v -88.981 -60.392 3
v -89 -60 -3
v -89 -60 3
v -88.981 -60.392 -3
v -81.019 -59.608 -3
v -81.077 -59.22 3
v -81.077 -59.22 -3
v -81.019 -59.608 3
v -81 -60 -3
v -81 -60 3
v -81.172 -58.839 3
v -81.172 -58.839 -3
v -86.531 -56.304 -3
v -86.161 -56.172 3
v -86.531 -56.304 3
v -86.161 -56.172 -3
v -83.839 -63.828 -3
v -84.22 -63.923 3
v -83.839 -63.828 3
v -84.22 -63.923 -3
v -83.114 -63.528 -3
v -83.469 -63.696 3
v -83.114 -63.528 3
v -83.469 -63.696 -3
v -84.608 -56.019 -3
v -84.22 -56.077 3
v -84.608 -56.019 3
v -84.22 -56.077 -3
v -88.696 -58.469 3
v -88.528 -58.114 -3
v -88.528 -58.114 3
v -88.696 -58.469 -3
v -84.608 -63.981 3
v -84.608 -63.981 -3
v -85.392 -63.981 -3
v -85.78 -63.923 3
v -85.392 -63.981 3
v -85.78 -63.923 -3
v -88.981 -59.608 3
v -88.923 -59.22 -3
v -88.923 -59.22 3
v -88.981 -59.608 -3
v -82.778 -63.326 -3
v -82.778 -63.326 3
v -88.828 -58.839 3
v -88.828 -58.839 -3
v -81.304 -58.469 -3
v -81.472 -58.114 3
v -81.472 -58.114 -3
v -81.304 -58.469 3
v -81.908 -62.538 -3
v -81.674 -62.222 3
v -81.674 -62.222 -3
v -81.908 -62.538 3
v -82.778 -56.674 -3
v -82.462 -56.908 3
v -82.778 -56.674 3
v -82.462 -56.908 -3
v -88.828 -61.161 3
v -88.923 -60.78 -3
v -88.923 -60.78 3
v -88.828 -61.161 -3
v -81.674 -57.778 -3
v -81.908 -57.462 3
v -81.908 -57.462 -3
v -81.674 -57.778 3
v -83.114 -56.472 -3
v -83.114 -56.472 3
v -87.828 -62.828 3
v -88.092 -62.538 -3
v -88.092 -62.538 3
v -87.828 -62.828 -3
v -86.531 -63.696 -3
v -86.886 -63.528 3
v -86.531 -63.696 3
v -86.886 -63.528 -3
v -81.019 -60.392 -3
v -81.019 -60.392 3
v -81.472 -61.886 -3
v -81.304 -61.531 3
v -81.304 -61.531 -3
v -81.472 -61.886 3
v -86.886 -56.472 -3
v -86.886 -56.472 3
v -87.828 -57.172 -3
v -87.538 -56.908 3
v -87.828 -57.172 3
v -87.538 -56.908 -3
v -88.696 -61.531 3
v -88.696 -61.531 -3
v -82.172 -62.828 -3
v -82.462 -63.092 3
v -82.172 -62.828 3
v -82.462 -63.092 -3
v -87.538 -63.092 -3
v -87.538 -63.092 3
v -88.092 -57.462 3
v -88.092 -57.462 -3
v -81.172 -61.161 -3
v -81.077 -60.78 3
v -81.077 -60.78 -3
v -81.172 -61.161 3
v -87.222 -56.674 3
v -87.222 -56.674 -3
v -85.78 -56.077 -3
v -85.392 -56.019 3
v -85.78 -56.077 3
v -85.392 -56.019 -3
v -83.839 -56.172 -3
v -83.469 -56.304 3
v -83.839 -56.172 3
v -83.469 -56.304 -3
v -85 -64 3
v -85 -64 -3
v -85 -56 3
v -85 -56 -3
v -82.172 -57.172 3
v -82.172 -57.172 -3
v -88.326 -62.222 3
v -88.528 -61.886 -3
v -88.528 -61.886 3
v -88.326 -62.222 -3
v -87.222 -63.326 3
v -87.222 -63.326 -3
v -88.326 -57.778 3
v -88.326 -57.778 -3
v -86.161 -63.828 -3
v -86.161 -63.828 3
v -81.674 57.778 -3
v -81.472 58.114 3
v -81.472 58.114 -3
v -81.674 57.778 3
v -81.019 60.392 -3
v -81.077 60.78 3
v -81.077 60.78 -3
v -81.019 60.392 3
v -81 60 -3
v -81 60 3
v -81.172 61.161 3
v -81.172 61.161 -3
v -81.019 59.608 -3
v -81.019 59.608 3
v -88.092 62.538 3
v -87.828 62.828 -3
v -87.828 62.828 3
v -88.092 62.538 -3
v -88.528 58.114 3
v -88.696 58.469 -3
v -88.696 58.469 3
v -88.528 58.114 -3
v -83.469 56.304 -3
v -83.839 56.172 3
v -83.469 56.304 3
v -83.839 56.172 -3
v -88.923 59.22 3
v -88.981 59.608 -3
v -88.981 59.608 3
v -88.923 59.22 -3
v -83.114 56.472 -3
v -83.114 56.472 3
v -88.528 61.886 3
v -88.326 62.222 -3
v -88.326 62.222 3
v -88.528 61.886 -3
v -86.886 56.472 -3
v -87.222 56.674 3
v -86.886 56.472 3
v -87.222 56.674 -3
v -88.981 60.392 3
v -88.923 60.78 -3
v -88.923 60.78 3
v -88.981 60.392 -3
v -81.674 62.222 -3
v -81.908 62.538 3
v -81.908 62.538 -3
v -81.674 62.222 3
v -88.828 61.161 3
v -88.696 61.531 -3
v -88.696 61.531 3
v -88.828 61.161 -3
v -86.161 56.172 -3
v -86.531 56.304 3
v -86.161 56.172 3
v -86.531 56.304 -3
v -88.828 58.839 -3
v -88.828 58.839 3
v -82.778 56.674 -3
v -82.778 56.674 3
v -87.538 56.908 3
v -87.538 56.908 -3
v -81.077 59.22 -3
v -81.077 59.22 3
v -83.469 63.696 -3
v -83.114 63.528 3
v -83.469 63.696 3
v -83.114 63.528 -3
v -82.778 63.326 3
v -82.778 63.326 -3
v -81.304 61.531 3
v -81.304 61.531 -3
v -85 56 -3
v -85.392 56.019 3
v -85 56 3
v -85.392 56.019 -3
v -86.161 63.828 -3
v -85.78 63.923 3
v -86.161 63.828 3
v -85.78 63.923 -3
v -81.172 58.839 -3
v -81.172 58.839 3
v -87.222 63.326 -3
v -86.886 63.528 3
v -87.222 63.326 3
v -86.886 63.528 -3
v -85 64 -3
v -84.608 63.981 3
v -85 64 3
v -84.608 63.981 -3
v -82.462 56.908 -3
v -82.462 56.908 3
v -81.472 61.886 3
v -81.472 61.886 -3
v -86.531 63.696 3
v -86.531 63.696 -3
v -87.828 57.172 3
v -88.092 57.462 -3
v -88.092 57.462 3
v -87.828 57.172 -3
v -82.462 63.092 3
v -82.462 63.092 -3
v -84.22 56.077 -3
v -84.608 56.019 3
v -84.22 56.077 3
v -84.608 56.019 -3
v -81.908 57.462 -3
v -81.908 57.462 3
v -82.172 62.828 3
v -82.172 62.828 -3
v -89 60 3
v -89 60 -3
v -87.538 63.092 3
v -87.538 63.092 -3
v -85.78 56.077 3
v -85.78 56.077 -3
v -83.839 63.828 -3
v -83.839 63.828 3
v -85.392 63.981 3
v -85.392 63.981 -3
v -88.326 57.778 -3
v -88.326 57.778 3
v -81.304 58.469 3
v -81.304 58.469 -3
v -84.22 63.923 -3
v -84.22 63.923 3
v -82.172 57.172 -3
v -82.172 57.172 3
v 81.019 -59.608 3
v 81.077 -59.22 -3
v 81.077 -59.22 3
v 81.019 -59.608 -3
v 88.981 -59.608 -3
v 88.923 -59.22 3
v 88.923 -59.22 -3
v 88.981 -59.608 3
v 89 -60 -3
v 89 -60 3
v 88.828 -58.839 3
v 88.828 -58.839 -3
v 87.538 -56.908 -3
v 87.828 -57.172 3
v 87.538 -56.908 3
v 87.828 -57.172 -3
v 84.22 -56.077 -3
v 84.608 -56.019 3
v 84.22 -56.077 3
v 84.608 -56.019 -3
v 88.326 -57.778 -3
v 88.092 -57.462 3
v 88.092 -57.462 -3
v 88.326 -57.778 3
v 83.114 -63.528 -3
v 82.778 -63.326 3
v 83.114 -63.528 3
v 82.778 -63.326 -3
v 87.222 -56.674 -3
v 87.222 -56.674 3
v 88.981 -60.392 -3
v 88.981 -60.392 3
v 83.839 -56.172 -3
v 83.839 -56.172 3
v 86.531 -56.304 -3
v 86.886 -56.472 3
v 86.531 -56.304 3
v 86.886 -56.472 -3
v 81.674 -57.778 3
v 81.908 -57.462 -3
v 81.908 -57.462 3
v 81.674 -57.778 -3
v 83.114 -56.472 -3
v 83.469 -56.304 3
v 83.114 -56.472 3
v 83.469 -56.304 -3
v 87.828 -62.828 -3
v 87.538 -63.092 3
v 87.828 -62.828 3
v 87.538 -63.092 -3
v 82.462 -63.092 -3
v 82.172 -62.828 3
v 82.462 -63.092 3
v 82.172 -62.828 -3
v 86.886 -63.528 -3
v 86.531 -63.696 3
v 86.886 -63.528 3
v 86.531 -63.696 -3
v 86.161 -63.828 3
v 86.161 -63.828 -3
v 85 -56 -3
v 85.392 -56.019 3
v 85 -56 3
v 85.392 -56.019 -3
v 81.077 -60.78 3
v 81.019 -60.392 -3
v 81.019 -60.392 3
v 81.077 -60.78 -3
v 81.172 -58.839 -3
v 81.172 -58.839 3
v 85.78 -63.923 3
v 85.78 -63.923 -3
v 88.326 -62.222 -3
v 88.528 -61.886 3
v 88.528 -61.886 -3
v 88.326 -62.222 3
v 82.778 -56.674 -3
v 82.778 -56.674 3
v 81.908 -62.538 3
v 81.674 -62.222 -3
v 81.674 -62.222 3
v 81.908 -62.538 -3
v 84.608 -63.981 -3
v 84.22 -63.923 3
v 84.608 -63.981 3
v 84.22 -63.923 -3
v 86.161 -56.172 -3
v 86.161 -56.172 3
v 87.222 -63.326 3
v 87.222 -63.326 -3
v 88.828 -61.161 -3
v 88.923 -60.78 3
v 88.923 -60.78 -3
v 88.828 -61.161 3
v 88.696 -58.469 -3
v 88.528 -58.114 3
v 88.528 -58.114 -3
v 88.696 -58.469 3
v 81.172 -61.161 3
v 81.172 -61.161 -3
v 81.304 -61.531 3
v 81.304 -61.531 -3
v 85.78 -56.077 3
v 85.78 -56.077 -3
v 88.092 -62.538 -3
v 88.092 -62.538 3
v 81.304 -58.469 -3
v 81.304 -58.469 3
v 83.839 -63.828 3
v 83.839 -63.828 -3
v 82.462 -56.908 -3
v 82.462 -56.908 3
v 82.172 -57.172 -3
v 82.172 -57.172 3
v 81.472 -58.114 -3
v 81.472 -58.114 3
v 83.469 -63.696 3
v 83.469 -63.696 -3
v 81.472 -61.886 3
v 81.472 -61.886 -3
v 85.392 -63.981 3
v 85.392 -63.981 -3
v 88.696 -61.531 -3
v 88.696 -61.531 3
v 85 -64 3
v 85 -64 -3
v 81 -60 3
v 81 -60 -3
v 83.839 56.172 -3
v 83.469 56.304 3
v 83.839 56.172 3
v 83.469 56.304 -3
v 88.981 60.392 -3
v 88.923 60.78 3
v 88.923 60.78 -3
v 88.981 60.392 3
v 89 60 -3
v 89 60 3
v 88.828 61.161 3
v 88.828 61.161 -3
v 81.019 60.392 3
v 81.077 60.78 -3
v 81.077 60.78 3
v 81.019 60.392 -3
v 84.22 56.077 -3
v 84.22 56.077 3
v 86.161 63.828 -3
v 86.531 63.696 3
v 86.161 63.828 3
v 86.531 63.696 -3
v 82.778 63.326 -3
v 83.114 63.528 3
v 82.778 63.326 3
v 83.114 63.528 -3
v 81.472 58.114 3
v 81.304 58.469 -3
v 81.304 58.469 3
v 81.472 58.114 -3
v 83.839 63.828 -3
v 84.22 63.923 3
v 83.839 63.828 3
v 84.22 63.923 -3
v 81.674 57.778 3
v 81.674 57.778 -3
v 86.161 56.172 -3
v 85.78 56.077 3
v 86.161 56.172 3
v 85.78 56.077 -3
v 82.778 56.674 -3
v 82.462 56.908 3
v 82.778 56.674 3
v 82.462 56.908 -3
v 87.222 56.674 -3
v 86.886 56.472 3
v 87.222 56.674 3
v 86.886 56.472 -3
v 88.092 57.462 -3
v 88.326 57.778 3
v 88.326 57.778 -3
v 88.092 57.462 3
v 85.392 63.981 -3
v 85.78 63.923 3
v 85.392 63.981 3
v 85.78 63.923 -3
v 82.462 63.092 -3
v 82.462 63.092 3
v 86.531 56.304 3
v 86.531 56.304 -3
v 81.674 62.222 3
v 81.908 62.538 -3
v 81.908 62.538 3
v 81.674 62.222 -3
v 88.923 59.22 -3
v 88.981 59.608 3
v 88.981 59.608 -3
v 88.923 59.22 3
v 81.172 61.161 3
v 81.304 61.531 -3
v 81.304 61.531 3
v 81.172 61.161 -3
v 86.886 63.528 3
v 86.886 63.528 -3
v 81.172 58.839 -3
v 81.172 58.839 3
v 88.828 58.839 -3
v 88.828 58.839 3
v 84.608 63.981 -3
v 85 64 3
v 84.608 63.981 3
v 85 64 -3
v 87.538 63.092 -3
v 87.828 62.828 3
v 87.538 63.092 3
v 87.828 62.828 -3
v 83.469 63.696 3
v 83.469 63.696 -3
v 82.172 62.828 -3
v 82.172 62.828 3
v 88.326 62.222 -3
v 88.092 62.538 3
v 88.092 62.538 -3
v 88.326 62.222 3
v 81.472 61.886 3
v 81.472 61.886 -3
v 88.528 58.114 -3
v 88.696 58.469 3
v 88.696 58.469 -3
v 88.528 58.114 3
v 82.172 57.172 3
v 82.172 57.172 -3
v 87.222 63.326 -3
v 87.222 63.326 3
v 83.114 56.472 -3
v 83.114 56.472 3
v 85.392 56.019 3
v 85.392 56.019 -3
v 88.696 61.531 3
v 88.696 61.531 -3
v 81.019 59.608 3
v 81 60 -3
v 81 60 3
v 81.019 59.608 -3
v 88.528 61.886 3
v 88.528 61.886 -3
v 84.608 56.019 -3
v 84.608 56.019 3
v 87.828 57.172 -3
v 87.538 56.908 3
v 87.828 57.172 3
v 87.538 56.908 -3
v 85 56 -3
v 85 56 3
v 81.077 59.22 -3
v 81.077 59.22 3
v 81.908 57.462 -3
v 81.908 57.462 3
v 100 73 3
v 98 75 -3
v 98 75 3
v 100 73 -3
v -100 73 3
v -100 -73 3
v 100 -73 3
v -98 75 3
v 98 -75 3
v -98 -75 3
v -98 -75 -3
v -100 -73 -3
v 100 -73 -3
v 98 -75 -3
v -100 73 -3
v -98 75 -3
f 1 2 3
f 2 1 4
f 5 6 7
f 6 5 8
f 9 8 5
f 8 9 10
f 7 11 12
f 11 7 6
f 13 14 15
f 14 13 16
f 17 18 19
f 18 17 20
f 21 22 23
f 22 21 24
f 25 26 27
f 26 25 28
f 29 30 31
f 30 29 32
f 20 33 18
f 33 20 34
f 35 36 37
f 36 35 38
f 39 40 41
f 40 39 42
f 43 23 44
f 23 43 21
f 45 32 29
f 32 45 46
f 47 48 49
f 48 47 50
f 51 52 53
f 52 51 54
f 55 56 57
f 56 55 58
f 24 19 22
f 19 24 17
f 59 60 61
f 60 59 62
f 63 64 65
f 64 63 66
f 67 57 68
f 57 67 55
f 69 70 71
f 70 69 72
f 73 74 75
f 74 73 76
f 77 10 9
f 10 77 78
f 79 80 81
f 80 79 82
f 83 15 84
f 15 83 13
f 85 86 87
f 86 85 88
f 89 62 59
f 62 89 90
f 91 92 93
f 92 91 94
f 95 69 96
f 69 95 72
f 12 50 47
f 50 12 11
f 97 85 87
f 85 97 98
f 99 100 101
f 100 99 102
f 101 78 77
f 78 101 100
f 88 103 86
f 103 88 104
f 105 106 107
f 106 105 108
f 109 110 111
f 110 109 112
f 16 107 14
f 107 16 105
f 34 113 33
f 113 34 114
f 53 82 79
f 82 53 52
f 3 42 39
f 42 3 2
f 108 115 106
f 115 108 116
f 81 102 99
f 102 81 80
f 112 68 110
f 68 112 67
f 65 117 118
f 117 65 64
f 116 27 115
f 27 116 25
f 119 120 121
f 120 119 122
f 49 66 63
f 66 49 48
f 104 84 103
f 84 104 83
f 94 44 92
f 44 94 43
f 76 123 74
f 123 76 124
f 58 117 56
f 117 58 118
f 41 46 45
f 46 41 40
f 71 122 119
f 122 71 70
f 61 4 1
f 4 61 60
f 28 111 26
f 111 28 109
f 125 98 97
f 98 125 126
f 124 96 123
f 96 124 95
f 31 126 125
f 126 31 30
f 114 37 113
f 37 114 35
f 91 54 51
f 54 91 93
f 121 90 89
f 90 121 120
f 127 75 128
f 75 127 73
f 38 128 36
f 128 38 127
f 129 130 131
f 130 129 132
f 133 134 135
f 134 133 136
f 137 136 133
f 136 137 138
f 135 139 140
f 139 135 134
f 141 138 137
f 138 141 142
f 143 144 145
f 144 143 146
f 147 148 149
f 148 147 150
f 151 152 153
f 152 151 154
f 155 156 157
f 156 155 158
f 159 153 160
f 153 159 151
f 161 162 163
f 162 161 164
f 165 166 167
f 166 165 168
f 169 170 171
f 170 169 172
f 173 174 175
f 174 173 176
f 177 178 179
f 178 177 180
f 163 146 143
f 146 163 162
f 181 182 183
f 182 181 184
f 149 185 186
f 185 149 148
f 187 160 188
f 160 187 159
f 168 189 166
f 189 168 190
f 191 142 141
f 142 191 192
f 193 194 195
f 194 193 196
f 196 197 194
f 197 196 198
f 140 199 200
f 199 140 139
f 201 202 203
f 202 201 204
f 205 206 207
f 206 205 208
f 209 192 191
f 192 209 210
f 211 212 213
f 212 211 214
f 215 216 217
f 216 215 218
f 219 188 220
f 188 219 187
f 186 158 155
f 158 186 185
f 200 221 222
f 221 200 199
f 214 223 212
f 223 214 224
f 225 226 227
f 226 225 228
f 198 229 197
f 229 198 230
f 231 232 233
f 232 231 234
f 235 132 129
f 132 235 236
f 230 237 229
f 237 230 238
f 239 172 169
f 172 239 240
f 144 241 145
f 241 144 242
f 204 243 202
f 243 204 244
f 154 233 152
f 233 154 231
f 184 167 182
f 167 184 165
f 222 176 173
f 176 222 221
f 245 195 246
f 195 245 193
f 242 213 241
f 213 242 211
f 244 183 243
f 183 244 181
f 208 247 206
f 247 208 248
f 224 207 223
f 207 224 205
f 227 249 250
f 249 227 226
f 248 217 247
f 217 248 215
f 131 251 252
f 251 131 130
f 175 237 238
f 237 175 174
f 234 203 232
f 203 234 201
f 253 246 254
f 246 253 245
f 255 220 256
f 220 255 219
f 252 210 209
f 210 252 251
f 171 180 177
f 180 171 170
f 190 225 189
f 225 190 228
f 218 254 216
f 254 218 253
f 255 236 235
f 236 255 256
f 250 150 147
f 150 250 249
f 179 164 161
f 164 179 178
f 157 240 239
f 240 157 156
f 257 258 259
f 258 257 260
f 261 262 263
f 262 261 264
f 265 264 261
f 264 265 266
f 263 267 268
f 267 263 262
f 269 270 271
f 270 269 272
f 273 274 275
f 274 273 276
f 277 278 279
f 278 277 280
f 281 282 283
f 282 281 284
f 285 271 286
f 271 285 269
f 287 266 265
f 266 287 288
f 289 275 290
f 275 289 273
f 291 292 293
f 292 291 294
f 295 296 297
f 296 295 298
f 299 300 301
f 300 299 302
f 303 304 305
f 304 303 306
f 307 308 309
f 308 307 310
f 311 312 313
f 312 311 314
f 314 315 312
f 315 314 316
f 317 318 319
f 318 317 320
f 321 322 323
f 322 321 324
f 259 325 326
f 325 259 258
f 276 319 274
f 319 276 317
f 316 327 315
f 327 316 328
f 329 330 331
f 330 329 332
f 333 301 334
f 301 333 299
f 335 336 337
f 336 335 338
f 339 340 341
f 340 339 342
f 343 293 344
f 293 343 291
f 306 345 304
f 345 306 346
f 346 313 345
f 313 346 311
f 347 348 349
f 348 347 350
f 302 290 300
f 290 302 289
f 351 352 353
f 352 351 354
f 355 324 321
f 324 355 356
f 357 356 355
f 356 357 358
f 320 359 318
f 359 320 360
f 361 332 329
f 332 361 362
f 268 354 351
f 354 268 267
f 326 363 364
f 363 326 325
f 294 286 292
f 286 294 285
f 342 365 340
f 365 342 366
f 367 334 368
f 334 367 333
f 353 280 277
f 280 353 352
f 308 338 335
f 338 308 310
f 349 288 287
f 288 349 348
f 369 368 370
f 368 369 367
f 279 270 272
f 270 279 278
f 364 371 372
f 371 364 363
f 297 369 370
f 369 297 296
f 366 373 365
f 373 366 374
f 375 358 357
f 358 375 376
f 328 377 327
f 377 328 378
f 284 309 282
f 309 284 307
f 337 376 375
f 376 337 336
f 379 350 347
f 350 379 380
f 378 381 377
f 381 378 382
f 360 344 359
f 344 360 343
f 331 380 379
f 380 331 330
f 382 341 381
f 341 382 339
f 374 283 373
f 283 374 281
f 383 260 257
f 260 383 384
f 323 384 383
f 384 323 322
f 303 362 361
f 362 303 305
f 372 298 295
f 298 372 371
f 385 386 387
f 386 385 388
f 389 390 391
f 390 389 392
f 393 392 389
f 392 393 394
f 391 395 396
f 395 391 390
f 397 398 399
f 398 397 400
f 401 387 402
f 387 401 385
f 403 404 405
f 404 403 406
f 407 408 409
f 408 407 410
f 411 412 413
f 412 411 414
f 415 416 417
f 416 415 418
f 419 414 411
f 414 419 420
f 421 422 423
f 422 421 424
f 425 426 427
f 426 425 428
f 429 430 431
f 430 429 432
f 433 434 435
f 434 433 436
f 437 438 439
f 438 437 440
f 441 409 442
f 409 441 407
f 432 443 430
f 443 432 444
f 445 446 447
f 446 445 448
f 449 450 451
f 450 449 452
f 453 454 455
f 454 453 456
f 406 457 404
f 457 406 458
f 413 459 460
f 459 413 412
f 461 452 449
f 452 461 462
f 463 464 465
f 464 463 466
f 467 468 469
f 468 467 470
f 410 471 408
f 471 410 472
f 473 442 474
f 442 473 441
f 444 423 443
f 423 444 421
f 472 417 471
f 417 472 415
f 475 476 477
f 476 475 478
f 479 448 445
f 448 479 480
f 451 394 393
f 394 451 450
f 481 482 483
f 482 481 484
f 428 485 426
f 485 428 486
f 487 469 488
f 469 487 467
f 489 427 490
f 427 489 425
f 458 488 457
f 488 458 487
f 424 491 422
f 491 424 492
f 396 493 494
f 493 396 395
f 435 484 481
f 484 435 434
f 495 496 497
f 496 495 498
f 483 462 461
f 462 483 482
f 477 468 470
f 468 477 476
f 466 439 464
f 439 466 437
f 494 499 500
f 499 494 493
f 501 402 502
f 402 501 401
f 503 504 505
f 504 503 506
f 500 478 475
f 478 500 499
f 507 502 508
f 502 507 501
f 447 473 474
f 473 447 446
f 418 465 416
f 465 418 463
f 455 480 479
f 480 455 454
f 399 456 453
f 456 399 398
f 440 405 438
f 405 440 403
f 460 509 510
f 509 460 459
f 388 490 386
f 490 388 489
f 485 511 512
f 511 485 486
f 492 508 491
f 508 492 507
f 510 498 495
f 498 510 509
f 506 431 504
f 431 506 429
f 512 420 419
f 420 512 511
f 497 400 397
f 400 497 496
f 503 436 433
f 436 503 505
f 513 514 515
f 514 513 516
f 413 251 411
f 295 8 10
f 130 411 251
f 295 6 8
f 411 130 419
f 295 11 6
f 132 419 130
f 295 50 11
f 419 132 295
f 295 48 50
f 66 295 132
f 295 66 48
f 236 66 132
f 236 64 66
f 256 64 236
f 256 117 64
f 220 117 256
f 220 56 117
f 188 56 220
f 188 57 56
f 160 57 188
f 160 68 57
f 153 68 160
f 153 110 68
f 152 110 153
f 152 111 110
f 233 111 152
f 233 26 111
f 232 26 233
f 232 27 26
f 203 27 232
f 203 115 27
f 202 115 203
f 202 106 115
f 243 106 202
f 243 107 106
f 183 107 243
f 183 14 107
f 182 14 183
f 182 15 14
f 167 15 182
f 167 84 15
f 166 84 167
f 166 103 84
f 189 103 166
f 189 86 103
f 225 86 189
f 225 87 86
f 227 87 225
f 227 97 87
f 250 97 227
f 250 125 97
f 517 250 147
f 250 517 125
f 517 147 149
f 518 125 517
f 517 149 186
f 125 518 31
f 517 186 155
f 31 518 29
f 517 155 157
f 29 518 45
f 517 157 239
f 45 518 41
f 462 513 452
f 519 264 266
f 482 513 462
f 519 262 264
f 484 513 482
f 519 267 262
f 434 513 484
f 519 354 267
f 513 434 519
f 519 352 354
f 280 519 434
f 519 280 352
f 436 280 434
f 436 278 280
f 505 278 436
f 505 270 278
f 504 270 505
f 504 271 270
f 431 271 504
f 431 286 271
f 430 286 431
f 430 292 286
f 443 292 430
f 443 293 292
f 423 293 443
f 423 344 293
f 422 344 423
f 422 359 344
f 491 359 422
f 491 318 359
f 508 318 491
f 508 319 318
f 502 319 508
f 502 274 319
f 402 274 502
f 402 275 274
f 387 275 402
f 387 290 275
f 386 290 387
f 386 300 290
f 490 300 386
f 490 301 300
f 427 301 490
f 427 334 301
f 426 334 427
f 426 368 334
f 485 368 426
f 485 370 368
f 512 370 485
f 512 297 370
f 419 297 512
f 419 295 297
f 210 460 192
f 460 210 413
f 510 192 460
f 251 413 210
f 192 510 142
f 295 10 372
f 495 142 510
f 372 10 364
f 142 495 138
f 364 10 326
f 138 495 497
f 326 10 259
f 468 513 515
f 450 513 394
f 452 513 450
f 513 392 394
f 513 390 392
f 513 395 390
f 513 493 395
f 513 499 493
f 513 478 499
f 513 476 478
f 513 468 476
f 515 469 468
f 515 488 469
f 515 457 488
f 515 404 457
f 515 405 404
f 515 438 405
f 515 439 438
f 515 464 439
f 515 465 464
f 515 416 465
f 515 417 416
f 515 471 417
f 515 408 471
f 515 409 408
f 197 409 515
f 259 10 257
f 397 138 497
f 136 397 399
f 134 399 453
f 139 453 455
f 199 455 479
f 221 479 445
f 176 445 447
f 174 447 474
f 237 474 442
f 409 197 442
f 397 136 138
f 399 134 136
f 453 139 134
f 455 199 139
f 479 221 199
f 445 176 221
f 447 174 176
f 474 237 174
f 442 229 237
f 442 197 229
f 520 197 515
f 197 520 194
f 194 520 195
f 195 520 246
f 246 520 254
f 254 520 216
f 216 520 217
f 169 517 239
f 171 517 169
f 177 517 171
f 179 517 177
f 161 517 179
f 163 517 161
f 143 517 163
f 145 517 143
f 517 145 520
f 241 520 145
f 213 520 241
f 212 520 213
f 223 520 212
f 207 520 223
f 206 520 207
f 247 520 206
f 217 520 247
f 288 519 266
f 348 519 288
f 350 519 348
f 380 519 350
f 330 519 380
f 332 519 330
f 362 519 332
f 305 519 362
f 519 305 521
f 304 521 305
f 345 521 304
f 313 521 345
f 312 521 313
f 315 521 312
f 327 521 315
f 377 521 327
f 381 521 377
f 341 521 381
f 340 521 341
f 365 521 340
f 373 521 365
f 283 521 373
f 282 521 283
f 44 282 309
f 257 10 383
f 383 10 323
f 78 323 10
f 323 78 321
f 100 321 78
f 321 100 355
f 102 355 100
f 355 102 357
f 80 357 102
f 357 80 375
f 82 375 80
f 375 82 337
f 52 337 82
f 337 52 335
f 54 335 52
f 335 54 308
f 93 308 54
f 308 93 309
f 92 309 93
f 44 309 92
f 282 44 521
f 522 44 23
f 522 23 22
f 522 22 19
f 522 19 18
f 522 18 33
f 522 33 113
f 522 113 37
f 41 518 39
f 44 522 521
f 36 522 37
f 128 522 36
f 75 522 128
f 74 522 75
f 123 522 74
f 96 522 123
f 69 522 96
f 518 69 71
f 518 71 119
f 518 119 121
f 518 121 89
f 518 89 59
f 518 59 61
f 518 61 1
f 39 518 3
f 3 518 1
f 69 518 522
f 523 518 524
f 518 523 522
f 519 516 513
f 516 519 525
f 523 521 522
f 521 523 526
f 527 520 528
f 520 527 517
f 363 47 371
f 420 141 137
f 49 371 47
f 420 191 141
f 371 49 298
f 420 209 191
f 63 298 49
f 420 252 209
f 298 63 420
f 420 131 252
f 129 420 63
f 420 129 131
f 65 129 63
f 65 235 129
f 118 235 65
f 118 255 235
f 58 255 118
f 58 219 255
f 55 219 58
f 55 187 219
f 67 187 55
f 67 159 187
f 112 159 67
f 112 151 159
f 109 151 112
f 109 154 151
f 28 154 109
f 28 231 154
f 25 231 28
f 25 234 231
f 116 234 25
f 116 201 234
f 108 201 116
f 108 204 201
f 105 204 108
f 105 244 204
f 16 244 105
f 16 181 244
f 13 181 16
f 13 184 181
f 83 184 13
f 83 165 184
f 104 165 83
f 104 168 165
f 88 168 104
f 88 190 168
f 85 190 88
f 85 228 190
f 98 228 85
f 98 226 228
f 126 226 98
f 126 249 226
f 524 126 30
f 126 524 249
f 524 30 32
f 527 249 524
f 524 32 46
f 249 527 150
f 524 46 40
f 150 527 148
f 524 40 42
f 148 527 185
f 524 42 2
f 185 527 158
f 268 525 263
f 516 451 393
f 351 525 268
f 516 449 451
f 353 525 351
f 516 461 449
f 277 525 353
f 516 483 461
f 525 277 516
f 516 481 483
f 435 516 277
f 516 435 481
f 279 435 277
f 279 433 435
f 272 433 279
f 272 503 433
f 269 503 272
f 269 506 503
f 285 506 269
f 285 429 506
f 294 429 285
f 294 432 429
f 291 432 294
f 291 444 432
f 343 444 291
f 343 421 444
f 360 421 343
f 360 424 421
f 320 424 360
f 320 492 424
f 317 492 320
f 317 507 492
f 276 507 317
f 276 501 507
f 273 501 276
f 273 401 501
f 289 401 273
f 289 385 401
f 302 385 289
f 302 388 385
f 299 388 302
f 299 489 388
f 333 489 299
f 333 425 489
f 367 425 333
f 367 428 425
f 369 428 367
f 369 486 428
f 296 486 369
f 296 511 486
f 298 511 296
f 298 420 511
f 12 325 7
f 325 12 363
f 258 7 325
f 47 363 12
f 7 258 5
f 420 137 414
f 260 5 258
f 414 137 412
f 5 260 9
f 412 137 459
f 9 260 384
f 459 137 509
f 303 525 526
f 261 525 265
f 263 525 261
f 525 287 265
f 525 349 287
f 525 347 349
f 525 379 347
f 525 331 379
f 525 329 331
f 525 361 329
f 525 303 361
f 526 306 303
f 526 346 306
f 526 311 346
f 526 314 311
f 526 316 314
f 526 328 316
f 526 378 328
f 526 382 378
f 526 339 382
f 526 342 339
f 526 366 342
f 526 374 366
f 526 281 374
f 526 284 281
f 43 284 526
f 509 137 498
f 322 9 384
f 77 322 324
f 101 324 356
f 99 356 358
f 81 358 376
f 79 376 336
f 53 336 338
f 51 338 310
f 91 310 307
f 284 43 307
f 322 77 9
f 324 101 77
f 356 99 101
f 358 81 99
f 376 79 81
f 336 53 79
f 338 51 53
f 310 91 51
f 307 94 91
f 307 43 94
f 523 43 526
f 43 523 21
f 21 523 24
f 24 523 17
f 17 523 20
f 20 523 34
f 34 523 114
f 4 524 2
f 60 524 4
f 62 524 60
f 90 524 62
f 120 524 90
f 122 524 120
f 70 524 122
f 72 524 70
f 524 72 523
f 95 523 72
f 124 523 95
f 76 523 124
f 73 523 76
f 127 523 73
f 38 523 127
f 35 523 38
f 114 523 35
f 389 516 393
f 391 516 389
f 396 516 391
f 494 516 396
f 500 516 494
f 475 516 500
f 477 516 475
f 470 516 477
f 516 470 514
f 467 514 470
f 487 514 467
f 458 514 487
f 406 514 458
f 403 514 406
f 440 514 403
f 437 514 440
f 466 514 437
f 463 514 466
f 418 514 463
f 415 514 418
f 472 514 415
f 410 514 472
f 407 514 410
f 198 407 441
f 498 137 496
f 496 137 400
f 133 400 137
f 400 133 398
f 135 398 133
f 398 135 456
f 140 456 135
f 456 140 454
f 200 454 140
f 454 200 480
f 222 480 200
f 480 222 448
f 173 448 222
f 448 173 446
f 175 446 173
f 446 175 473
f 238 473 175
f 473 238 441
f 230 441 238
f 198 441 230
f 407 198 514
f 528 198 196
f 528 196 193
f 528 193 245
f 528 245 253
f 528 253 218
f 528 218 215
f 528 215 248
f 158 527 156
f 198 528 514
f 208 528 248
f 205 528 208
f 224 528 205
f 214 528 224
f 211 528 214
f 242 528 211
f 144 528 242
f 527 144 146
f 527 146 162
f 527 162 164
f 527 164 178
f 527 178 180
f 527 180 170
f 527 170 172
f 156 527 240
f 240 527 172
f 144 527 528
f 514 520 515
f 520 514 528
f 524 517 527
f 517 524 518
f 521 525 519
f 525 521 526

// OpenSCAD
$fn = 64;

// Aluminium tooling plate (sheet) with subtle corner chamfers and mounting holes
length = 200;
width  = 150;
thickness = 6;

chamfer = 2;          // small edge chamfer to distinguish from a plain cube
hole_d = 8;           // typical mounting hole diameter
edge_margin = 15;     // distance from edges to hole centers

module chamfered_plate(l, w, t, c) {
    // 2D rectangle with 45° corner chamfers, then extruded
    linear_extrude(height=t, center=true)
        polygon(points=[
            [-l/2 + c, -w/2],
            [ l/2 - c, -w/2],
            [ l/2,     -w/2 + c],
            [ l/2,      w/2 - c],
            [ l/2 - c,  w/2],
            [-l/2 + c,  w/2],
            [-l/2,      w/2 - c],
            [-l/2,     -w/2 + c]
        ]);
}

module tooling_plate(l, w, t, c, hd, m) {
    color([0.75, 0.78, 0.82])
    difference() {
        chamfered_plate(l, w, t, c);

        // 4 corner mounting holes (through)
        for (sx = [-1, 1], sy = [-1, 1])
            translate([sx*(l/2 - m), sy*(w/2 - m), 0])
                cylinder(h=t + 0.2, d=hd, center=true);
    }
}

tooling_plate(length, width, thickness, chamfer, hole_d, edge_margin);
